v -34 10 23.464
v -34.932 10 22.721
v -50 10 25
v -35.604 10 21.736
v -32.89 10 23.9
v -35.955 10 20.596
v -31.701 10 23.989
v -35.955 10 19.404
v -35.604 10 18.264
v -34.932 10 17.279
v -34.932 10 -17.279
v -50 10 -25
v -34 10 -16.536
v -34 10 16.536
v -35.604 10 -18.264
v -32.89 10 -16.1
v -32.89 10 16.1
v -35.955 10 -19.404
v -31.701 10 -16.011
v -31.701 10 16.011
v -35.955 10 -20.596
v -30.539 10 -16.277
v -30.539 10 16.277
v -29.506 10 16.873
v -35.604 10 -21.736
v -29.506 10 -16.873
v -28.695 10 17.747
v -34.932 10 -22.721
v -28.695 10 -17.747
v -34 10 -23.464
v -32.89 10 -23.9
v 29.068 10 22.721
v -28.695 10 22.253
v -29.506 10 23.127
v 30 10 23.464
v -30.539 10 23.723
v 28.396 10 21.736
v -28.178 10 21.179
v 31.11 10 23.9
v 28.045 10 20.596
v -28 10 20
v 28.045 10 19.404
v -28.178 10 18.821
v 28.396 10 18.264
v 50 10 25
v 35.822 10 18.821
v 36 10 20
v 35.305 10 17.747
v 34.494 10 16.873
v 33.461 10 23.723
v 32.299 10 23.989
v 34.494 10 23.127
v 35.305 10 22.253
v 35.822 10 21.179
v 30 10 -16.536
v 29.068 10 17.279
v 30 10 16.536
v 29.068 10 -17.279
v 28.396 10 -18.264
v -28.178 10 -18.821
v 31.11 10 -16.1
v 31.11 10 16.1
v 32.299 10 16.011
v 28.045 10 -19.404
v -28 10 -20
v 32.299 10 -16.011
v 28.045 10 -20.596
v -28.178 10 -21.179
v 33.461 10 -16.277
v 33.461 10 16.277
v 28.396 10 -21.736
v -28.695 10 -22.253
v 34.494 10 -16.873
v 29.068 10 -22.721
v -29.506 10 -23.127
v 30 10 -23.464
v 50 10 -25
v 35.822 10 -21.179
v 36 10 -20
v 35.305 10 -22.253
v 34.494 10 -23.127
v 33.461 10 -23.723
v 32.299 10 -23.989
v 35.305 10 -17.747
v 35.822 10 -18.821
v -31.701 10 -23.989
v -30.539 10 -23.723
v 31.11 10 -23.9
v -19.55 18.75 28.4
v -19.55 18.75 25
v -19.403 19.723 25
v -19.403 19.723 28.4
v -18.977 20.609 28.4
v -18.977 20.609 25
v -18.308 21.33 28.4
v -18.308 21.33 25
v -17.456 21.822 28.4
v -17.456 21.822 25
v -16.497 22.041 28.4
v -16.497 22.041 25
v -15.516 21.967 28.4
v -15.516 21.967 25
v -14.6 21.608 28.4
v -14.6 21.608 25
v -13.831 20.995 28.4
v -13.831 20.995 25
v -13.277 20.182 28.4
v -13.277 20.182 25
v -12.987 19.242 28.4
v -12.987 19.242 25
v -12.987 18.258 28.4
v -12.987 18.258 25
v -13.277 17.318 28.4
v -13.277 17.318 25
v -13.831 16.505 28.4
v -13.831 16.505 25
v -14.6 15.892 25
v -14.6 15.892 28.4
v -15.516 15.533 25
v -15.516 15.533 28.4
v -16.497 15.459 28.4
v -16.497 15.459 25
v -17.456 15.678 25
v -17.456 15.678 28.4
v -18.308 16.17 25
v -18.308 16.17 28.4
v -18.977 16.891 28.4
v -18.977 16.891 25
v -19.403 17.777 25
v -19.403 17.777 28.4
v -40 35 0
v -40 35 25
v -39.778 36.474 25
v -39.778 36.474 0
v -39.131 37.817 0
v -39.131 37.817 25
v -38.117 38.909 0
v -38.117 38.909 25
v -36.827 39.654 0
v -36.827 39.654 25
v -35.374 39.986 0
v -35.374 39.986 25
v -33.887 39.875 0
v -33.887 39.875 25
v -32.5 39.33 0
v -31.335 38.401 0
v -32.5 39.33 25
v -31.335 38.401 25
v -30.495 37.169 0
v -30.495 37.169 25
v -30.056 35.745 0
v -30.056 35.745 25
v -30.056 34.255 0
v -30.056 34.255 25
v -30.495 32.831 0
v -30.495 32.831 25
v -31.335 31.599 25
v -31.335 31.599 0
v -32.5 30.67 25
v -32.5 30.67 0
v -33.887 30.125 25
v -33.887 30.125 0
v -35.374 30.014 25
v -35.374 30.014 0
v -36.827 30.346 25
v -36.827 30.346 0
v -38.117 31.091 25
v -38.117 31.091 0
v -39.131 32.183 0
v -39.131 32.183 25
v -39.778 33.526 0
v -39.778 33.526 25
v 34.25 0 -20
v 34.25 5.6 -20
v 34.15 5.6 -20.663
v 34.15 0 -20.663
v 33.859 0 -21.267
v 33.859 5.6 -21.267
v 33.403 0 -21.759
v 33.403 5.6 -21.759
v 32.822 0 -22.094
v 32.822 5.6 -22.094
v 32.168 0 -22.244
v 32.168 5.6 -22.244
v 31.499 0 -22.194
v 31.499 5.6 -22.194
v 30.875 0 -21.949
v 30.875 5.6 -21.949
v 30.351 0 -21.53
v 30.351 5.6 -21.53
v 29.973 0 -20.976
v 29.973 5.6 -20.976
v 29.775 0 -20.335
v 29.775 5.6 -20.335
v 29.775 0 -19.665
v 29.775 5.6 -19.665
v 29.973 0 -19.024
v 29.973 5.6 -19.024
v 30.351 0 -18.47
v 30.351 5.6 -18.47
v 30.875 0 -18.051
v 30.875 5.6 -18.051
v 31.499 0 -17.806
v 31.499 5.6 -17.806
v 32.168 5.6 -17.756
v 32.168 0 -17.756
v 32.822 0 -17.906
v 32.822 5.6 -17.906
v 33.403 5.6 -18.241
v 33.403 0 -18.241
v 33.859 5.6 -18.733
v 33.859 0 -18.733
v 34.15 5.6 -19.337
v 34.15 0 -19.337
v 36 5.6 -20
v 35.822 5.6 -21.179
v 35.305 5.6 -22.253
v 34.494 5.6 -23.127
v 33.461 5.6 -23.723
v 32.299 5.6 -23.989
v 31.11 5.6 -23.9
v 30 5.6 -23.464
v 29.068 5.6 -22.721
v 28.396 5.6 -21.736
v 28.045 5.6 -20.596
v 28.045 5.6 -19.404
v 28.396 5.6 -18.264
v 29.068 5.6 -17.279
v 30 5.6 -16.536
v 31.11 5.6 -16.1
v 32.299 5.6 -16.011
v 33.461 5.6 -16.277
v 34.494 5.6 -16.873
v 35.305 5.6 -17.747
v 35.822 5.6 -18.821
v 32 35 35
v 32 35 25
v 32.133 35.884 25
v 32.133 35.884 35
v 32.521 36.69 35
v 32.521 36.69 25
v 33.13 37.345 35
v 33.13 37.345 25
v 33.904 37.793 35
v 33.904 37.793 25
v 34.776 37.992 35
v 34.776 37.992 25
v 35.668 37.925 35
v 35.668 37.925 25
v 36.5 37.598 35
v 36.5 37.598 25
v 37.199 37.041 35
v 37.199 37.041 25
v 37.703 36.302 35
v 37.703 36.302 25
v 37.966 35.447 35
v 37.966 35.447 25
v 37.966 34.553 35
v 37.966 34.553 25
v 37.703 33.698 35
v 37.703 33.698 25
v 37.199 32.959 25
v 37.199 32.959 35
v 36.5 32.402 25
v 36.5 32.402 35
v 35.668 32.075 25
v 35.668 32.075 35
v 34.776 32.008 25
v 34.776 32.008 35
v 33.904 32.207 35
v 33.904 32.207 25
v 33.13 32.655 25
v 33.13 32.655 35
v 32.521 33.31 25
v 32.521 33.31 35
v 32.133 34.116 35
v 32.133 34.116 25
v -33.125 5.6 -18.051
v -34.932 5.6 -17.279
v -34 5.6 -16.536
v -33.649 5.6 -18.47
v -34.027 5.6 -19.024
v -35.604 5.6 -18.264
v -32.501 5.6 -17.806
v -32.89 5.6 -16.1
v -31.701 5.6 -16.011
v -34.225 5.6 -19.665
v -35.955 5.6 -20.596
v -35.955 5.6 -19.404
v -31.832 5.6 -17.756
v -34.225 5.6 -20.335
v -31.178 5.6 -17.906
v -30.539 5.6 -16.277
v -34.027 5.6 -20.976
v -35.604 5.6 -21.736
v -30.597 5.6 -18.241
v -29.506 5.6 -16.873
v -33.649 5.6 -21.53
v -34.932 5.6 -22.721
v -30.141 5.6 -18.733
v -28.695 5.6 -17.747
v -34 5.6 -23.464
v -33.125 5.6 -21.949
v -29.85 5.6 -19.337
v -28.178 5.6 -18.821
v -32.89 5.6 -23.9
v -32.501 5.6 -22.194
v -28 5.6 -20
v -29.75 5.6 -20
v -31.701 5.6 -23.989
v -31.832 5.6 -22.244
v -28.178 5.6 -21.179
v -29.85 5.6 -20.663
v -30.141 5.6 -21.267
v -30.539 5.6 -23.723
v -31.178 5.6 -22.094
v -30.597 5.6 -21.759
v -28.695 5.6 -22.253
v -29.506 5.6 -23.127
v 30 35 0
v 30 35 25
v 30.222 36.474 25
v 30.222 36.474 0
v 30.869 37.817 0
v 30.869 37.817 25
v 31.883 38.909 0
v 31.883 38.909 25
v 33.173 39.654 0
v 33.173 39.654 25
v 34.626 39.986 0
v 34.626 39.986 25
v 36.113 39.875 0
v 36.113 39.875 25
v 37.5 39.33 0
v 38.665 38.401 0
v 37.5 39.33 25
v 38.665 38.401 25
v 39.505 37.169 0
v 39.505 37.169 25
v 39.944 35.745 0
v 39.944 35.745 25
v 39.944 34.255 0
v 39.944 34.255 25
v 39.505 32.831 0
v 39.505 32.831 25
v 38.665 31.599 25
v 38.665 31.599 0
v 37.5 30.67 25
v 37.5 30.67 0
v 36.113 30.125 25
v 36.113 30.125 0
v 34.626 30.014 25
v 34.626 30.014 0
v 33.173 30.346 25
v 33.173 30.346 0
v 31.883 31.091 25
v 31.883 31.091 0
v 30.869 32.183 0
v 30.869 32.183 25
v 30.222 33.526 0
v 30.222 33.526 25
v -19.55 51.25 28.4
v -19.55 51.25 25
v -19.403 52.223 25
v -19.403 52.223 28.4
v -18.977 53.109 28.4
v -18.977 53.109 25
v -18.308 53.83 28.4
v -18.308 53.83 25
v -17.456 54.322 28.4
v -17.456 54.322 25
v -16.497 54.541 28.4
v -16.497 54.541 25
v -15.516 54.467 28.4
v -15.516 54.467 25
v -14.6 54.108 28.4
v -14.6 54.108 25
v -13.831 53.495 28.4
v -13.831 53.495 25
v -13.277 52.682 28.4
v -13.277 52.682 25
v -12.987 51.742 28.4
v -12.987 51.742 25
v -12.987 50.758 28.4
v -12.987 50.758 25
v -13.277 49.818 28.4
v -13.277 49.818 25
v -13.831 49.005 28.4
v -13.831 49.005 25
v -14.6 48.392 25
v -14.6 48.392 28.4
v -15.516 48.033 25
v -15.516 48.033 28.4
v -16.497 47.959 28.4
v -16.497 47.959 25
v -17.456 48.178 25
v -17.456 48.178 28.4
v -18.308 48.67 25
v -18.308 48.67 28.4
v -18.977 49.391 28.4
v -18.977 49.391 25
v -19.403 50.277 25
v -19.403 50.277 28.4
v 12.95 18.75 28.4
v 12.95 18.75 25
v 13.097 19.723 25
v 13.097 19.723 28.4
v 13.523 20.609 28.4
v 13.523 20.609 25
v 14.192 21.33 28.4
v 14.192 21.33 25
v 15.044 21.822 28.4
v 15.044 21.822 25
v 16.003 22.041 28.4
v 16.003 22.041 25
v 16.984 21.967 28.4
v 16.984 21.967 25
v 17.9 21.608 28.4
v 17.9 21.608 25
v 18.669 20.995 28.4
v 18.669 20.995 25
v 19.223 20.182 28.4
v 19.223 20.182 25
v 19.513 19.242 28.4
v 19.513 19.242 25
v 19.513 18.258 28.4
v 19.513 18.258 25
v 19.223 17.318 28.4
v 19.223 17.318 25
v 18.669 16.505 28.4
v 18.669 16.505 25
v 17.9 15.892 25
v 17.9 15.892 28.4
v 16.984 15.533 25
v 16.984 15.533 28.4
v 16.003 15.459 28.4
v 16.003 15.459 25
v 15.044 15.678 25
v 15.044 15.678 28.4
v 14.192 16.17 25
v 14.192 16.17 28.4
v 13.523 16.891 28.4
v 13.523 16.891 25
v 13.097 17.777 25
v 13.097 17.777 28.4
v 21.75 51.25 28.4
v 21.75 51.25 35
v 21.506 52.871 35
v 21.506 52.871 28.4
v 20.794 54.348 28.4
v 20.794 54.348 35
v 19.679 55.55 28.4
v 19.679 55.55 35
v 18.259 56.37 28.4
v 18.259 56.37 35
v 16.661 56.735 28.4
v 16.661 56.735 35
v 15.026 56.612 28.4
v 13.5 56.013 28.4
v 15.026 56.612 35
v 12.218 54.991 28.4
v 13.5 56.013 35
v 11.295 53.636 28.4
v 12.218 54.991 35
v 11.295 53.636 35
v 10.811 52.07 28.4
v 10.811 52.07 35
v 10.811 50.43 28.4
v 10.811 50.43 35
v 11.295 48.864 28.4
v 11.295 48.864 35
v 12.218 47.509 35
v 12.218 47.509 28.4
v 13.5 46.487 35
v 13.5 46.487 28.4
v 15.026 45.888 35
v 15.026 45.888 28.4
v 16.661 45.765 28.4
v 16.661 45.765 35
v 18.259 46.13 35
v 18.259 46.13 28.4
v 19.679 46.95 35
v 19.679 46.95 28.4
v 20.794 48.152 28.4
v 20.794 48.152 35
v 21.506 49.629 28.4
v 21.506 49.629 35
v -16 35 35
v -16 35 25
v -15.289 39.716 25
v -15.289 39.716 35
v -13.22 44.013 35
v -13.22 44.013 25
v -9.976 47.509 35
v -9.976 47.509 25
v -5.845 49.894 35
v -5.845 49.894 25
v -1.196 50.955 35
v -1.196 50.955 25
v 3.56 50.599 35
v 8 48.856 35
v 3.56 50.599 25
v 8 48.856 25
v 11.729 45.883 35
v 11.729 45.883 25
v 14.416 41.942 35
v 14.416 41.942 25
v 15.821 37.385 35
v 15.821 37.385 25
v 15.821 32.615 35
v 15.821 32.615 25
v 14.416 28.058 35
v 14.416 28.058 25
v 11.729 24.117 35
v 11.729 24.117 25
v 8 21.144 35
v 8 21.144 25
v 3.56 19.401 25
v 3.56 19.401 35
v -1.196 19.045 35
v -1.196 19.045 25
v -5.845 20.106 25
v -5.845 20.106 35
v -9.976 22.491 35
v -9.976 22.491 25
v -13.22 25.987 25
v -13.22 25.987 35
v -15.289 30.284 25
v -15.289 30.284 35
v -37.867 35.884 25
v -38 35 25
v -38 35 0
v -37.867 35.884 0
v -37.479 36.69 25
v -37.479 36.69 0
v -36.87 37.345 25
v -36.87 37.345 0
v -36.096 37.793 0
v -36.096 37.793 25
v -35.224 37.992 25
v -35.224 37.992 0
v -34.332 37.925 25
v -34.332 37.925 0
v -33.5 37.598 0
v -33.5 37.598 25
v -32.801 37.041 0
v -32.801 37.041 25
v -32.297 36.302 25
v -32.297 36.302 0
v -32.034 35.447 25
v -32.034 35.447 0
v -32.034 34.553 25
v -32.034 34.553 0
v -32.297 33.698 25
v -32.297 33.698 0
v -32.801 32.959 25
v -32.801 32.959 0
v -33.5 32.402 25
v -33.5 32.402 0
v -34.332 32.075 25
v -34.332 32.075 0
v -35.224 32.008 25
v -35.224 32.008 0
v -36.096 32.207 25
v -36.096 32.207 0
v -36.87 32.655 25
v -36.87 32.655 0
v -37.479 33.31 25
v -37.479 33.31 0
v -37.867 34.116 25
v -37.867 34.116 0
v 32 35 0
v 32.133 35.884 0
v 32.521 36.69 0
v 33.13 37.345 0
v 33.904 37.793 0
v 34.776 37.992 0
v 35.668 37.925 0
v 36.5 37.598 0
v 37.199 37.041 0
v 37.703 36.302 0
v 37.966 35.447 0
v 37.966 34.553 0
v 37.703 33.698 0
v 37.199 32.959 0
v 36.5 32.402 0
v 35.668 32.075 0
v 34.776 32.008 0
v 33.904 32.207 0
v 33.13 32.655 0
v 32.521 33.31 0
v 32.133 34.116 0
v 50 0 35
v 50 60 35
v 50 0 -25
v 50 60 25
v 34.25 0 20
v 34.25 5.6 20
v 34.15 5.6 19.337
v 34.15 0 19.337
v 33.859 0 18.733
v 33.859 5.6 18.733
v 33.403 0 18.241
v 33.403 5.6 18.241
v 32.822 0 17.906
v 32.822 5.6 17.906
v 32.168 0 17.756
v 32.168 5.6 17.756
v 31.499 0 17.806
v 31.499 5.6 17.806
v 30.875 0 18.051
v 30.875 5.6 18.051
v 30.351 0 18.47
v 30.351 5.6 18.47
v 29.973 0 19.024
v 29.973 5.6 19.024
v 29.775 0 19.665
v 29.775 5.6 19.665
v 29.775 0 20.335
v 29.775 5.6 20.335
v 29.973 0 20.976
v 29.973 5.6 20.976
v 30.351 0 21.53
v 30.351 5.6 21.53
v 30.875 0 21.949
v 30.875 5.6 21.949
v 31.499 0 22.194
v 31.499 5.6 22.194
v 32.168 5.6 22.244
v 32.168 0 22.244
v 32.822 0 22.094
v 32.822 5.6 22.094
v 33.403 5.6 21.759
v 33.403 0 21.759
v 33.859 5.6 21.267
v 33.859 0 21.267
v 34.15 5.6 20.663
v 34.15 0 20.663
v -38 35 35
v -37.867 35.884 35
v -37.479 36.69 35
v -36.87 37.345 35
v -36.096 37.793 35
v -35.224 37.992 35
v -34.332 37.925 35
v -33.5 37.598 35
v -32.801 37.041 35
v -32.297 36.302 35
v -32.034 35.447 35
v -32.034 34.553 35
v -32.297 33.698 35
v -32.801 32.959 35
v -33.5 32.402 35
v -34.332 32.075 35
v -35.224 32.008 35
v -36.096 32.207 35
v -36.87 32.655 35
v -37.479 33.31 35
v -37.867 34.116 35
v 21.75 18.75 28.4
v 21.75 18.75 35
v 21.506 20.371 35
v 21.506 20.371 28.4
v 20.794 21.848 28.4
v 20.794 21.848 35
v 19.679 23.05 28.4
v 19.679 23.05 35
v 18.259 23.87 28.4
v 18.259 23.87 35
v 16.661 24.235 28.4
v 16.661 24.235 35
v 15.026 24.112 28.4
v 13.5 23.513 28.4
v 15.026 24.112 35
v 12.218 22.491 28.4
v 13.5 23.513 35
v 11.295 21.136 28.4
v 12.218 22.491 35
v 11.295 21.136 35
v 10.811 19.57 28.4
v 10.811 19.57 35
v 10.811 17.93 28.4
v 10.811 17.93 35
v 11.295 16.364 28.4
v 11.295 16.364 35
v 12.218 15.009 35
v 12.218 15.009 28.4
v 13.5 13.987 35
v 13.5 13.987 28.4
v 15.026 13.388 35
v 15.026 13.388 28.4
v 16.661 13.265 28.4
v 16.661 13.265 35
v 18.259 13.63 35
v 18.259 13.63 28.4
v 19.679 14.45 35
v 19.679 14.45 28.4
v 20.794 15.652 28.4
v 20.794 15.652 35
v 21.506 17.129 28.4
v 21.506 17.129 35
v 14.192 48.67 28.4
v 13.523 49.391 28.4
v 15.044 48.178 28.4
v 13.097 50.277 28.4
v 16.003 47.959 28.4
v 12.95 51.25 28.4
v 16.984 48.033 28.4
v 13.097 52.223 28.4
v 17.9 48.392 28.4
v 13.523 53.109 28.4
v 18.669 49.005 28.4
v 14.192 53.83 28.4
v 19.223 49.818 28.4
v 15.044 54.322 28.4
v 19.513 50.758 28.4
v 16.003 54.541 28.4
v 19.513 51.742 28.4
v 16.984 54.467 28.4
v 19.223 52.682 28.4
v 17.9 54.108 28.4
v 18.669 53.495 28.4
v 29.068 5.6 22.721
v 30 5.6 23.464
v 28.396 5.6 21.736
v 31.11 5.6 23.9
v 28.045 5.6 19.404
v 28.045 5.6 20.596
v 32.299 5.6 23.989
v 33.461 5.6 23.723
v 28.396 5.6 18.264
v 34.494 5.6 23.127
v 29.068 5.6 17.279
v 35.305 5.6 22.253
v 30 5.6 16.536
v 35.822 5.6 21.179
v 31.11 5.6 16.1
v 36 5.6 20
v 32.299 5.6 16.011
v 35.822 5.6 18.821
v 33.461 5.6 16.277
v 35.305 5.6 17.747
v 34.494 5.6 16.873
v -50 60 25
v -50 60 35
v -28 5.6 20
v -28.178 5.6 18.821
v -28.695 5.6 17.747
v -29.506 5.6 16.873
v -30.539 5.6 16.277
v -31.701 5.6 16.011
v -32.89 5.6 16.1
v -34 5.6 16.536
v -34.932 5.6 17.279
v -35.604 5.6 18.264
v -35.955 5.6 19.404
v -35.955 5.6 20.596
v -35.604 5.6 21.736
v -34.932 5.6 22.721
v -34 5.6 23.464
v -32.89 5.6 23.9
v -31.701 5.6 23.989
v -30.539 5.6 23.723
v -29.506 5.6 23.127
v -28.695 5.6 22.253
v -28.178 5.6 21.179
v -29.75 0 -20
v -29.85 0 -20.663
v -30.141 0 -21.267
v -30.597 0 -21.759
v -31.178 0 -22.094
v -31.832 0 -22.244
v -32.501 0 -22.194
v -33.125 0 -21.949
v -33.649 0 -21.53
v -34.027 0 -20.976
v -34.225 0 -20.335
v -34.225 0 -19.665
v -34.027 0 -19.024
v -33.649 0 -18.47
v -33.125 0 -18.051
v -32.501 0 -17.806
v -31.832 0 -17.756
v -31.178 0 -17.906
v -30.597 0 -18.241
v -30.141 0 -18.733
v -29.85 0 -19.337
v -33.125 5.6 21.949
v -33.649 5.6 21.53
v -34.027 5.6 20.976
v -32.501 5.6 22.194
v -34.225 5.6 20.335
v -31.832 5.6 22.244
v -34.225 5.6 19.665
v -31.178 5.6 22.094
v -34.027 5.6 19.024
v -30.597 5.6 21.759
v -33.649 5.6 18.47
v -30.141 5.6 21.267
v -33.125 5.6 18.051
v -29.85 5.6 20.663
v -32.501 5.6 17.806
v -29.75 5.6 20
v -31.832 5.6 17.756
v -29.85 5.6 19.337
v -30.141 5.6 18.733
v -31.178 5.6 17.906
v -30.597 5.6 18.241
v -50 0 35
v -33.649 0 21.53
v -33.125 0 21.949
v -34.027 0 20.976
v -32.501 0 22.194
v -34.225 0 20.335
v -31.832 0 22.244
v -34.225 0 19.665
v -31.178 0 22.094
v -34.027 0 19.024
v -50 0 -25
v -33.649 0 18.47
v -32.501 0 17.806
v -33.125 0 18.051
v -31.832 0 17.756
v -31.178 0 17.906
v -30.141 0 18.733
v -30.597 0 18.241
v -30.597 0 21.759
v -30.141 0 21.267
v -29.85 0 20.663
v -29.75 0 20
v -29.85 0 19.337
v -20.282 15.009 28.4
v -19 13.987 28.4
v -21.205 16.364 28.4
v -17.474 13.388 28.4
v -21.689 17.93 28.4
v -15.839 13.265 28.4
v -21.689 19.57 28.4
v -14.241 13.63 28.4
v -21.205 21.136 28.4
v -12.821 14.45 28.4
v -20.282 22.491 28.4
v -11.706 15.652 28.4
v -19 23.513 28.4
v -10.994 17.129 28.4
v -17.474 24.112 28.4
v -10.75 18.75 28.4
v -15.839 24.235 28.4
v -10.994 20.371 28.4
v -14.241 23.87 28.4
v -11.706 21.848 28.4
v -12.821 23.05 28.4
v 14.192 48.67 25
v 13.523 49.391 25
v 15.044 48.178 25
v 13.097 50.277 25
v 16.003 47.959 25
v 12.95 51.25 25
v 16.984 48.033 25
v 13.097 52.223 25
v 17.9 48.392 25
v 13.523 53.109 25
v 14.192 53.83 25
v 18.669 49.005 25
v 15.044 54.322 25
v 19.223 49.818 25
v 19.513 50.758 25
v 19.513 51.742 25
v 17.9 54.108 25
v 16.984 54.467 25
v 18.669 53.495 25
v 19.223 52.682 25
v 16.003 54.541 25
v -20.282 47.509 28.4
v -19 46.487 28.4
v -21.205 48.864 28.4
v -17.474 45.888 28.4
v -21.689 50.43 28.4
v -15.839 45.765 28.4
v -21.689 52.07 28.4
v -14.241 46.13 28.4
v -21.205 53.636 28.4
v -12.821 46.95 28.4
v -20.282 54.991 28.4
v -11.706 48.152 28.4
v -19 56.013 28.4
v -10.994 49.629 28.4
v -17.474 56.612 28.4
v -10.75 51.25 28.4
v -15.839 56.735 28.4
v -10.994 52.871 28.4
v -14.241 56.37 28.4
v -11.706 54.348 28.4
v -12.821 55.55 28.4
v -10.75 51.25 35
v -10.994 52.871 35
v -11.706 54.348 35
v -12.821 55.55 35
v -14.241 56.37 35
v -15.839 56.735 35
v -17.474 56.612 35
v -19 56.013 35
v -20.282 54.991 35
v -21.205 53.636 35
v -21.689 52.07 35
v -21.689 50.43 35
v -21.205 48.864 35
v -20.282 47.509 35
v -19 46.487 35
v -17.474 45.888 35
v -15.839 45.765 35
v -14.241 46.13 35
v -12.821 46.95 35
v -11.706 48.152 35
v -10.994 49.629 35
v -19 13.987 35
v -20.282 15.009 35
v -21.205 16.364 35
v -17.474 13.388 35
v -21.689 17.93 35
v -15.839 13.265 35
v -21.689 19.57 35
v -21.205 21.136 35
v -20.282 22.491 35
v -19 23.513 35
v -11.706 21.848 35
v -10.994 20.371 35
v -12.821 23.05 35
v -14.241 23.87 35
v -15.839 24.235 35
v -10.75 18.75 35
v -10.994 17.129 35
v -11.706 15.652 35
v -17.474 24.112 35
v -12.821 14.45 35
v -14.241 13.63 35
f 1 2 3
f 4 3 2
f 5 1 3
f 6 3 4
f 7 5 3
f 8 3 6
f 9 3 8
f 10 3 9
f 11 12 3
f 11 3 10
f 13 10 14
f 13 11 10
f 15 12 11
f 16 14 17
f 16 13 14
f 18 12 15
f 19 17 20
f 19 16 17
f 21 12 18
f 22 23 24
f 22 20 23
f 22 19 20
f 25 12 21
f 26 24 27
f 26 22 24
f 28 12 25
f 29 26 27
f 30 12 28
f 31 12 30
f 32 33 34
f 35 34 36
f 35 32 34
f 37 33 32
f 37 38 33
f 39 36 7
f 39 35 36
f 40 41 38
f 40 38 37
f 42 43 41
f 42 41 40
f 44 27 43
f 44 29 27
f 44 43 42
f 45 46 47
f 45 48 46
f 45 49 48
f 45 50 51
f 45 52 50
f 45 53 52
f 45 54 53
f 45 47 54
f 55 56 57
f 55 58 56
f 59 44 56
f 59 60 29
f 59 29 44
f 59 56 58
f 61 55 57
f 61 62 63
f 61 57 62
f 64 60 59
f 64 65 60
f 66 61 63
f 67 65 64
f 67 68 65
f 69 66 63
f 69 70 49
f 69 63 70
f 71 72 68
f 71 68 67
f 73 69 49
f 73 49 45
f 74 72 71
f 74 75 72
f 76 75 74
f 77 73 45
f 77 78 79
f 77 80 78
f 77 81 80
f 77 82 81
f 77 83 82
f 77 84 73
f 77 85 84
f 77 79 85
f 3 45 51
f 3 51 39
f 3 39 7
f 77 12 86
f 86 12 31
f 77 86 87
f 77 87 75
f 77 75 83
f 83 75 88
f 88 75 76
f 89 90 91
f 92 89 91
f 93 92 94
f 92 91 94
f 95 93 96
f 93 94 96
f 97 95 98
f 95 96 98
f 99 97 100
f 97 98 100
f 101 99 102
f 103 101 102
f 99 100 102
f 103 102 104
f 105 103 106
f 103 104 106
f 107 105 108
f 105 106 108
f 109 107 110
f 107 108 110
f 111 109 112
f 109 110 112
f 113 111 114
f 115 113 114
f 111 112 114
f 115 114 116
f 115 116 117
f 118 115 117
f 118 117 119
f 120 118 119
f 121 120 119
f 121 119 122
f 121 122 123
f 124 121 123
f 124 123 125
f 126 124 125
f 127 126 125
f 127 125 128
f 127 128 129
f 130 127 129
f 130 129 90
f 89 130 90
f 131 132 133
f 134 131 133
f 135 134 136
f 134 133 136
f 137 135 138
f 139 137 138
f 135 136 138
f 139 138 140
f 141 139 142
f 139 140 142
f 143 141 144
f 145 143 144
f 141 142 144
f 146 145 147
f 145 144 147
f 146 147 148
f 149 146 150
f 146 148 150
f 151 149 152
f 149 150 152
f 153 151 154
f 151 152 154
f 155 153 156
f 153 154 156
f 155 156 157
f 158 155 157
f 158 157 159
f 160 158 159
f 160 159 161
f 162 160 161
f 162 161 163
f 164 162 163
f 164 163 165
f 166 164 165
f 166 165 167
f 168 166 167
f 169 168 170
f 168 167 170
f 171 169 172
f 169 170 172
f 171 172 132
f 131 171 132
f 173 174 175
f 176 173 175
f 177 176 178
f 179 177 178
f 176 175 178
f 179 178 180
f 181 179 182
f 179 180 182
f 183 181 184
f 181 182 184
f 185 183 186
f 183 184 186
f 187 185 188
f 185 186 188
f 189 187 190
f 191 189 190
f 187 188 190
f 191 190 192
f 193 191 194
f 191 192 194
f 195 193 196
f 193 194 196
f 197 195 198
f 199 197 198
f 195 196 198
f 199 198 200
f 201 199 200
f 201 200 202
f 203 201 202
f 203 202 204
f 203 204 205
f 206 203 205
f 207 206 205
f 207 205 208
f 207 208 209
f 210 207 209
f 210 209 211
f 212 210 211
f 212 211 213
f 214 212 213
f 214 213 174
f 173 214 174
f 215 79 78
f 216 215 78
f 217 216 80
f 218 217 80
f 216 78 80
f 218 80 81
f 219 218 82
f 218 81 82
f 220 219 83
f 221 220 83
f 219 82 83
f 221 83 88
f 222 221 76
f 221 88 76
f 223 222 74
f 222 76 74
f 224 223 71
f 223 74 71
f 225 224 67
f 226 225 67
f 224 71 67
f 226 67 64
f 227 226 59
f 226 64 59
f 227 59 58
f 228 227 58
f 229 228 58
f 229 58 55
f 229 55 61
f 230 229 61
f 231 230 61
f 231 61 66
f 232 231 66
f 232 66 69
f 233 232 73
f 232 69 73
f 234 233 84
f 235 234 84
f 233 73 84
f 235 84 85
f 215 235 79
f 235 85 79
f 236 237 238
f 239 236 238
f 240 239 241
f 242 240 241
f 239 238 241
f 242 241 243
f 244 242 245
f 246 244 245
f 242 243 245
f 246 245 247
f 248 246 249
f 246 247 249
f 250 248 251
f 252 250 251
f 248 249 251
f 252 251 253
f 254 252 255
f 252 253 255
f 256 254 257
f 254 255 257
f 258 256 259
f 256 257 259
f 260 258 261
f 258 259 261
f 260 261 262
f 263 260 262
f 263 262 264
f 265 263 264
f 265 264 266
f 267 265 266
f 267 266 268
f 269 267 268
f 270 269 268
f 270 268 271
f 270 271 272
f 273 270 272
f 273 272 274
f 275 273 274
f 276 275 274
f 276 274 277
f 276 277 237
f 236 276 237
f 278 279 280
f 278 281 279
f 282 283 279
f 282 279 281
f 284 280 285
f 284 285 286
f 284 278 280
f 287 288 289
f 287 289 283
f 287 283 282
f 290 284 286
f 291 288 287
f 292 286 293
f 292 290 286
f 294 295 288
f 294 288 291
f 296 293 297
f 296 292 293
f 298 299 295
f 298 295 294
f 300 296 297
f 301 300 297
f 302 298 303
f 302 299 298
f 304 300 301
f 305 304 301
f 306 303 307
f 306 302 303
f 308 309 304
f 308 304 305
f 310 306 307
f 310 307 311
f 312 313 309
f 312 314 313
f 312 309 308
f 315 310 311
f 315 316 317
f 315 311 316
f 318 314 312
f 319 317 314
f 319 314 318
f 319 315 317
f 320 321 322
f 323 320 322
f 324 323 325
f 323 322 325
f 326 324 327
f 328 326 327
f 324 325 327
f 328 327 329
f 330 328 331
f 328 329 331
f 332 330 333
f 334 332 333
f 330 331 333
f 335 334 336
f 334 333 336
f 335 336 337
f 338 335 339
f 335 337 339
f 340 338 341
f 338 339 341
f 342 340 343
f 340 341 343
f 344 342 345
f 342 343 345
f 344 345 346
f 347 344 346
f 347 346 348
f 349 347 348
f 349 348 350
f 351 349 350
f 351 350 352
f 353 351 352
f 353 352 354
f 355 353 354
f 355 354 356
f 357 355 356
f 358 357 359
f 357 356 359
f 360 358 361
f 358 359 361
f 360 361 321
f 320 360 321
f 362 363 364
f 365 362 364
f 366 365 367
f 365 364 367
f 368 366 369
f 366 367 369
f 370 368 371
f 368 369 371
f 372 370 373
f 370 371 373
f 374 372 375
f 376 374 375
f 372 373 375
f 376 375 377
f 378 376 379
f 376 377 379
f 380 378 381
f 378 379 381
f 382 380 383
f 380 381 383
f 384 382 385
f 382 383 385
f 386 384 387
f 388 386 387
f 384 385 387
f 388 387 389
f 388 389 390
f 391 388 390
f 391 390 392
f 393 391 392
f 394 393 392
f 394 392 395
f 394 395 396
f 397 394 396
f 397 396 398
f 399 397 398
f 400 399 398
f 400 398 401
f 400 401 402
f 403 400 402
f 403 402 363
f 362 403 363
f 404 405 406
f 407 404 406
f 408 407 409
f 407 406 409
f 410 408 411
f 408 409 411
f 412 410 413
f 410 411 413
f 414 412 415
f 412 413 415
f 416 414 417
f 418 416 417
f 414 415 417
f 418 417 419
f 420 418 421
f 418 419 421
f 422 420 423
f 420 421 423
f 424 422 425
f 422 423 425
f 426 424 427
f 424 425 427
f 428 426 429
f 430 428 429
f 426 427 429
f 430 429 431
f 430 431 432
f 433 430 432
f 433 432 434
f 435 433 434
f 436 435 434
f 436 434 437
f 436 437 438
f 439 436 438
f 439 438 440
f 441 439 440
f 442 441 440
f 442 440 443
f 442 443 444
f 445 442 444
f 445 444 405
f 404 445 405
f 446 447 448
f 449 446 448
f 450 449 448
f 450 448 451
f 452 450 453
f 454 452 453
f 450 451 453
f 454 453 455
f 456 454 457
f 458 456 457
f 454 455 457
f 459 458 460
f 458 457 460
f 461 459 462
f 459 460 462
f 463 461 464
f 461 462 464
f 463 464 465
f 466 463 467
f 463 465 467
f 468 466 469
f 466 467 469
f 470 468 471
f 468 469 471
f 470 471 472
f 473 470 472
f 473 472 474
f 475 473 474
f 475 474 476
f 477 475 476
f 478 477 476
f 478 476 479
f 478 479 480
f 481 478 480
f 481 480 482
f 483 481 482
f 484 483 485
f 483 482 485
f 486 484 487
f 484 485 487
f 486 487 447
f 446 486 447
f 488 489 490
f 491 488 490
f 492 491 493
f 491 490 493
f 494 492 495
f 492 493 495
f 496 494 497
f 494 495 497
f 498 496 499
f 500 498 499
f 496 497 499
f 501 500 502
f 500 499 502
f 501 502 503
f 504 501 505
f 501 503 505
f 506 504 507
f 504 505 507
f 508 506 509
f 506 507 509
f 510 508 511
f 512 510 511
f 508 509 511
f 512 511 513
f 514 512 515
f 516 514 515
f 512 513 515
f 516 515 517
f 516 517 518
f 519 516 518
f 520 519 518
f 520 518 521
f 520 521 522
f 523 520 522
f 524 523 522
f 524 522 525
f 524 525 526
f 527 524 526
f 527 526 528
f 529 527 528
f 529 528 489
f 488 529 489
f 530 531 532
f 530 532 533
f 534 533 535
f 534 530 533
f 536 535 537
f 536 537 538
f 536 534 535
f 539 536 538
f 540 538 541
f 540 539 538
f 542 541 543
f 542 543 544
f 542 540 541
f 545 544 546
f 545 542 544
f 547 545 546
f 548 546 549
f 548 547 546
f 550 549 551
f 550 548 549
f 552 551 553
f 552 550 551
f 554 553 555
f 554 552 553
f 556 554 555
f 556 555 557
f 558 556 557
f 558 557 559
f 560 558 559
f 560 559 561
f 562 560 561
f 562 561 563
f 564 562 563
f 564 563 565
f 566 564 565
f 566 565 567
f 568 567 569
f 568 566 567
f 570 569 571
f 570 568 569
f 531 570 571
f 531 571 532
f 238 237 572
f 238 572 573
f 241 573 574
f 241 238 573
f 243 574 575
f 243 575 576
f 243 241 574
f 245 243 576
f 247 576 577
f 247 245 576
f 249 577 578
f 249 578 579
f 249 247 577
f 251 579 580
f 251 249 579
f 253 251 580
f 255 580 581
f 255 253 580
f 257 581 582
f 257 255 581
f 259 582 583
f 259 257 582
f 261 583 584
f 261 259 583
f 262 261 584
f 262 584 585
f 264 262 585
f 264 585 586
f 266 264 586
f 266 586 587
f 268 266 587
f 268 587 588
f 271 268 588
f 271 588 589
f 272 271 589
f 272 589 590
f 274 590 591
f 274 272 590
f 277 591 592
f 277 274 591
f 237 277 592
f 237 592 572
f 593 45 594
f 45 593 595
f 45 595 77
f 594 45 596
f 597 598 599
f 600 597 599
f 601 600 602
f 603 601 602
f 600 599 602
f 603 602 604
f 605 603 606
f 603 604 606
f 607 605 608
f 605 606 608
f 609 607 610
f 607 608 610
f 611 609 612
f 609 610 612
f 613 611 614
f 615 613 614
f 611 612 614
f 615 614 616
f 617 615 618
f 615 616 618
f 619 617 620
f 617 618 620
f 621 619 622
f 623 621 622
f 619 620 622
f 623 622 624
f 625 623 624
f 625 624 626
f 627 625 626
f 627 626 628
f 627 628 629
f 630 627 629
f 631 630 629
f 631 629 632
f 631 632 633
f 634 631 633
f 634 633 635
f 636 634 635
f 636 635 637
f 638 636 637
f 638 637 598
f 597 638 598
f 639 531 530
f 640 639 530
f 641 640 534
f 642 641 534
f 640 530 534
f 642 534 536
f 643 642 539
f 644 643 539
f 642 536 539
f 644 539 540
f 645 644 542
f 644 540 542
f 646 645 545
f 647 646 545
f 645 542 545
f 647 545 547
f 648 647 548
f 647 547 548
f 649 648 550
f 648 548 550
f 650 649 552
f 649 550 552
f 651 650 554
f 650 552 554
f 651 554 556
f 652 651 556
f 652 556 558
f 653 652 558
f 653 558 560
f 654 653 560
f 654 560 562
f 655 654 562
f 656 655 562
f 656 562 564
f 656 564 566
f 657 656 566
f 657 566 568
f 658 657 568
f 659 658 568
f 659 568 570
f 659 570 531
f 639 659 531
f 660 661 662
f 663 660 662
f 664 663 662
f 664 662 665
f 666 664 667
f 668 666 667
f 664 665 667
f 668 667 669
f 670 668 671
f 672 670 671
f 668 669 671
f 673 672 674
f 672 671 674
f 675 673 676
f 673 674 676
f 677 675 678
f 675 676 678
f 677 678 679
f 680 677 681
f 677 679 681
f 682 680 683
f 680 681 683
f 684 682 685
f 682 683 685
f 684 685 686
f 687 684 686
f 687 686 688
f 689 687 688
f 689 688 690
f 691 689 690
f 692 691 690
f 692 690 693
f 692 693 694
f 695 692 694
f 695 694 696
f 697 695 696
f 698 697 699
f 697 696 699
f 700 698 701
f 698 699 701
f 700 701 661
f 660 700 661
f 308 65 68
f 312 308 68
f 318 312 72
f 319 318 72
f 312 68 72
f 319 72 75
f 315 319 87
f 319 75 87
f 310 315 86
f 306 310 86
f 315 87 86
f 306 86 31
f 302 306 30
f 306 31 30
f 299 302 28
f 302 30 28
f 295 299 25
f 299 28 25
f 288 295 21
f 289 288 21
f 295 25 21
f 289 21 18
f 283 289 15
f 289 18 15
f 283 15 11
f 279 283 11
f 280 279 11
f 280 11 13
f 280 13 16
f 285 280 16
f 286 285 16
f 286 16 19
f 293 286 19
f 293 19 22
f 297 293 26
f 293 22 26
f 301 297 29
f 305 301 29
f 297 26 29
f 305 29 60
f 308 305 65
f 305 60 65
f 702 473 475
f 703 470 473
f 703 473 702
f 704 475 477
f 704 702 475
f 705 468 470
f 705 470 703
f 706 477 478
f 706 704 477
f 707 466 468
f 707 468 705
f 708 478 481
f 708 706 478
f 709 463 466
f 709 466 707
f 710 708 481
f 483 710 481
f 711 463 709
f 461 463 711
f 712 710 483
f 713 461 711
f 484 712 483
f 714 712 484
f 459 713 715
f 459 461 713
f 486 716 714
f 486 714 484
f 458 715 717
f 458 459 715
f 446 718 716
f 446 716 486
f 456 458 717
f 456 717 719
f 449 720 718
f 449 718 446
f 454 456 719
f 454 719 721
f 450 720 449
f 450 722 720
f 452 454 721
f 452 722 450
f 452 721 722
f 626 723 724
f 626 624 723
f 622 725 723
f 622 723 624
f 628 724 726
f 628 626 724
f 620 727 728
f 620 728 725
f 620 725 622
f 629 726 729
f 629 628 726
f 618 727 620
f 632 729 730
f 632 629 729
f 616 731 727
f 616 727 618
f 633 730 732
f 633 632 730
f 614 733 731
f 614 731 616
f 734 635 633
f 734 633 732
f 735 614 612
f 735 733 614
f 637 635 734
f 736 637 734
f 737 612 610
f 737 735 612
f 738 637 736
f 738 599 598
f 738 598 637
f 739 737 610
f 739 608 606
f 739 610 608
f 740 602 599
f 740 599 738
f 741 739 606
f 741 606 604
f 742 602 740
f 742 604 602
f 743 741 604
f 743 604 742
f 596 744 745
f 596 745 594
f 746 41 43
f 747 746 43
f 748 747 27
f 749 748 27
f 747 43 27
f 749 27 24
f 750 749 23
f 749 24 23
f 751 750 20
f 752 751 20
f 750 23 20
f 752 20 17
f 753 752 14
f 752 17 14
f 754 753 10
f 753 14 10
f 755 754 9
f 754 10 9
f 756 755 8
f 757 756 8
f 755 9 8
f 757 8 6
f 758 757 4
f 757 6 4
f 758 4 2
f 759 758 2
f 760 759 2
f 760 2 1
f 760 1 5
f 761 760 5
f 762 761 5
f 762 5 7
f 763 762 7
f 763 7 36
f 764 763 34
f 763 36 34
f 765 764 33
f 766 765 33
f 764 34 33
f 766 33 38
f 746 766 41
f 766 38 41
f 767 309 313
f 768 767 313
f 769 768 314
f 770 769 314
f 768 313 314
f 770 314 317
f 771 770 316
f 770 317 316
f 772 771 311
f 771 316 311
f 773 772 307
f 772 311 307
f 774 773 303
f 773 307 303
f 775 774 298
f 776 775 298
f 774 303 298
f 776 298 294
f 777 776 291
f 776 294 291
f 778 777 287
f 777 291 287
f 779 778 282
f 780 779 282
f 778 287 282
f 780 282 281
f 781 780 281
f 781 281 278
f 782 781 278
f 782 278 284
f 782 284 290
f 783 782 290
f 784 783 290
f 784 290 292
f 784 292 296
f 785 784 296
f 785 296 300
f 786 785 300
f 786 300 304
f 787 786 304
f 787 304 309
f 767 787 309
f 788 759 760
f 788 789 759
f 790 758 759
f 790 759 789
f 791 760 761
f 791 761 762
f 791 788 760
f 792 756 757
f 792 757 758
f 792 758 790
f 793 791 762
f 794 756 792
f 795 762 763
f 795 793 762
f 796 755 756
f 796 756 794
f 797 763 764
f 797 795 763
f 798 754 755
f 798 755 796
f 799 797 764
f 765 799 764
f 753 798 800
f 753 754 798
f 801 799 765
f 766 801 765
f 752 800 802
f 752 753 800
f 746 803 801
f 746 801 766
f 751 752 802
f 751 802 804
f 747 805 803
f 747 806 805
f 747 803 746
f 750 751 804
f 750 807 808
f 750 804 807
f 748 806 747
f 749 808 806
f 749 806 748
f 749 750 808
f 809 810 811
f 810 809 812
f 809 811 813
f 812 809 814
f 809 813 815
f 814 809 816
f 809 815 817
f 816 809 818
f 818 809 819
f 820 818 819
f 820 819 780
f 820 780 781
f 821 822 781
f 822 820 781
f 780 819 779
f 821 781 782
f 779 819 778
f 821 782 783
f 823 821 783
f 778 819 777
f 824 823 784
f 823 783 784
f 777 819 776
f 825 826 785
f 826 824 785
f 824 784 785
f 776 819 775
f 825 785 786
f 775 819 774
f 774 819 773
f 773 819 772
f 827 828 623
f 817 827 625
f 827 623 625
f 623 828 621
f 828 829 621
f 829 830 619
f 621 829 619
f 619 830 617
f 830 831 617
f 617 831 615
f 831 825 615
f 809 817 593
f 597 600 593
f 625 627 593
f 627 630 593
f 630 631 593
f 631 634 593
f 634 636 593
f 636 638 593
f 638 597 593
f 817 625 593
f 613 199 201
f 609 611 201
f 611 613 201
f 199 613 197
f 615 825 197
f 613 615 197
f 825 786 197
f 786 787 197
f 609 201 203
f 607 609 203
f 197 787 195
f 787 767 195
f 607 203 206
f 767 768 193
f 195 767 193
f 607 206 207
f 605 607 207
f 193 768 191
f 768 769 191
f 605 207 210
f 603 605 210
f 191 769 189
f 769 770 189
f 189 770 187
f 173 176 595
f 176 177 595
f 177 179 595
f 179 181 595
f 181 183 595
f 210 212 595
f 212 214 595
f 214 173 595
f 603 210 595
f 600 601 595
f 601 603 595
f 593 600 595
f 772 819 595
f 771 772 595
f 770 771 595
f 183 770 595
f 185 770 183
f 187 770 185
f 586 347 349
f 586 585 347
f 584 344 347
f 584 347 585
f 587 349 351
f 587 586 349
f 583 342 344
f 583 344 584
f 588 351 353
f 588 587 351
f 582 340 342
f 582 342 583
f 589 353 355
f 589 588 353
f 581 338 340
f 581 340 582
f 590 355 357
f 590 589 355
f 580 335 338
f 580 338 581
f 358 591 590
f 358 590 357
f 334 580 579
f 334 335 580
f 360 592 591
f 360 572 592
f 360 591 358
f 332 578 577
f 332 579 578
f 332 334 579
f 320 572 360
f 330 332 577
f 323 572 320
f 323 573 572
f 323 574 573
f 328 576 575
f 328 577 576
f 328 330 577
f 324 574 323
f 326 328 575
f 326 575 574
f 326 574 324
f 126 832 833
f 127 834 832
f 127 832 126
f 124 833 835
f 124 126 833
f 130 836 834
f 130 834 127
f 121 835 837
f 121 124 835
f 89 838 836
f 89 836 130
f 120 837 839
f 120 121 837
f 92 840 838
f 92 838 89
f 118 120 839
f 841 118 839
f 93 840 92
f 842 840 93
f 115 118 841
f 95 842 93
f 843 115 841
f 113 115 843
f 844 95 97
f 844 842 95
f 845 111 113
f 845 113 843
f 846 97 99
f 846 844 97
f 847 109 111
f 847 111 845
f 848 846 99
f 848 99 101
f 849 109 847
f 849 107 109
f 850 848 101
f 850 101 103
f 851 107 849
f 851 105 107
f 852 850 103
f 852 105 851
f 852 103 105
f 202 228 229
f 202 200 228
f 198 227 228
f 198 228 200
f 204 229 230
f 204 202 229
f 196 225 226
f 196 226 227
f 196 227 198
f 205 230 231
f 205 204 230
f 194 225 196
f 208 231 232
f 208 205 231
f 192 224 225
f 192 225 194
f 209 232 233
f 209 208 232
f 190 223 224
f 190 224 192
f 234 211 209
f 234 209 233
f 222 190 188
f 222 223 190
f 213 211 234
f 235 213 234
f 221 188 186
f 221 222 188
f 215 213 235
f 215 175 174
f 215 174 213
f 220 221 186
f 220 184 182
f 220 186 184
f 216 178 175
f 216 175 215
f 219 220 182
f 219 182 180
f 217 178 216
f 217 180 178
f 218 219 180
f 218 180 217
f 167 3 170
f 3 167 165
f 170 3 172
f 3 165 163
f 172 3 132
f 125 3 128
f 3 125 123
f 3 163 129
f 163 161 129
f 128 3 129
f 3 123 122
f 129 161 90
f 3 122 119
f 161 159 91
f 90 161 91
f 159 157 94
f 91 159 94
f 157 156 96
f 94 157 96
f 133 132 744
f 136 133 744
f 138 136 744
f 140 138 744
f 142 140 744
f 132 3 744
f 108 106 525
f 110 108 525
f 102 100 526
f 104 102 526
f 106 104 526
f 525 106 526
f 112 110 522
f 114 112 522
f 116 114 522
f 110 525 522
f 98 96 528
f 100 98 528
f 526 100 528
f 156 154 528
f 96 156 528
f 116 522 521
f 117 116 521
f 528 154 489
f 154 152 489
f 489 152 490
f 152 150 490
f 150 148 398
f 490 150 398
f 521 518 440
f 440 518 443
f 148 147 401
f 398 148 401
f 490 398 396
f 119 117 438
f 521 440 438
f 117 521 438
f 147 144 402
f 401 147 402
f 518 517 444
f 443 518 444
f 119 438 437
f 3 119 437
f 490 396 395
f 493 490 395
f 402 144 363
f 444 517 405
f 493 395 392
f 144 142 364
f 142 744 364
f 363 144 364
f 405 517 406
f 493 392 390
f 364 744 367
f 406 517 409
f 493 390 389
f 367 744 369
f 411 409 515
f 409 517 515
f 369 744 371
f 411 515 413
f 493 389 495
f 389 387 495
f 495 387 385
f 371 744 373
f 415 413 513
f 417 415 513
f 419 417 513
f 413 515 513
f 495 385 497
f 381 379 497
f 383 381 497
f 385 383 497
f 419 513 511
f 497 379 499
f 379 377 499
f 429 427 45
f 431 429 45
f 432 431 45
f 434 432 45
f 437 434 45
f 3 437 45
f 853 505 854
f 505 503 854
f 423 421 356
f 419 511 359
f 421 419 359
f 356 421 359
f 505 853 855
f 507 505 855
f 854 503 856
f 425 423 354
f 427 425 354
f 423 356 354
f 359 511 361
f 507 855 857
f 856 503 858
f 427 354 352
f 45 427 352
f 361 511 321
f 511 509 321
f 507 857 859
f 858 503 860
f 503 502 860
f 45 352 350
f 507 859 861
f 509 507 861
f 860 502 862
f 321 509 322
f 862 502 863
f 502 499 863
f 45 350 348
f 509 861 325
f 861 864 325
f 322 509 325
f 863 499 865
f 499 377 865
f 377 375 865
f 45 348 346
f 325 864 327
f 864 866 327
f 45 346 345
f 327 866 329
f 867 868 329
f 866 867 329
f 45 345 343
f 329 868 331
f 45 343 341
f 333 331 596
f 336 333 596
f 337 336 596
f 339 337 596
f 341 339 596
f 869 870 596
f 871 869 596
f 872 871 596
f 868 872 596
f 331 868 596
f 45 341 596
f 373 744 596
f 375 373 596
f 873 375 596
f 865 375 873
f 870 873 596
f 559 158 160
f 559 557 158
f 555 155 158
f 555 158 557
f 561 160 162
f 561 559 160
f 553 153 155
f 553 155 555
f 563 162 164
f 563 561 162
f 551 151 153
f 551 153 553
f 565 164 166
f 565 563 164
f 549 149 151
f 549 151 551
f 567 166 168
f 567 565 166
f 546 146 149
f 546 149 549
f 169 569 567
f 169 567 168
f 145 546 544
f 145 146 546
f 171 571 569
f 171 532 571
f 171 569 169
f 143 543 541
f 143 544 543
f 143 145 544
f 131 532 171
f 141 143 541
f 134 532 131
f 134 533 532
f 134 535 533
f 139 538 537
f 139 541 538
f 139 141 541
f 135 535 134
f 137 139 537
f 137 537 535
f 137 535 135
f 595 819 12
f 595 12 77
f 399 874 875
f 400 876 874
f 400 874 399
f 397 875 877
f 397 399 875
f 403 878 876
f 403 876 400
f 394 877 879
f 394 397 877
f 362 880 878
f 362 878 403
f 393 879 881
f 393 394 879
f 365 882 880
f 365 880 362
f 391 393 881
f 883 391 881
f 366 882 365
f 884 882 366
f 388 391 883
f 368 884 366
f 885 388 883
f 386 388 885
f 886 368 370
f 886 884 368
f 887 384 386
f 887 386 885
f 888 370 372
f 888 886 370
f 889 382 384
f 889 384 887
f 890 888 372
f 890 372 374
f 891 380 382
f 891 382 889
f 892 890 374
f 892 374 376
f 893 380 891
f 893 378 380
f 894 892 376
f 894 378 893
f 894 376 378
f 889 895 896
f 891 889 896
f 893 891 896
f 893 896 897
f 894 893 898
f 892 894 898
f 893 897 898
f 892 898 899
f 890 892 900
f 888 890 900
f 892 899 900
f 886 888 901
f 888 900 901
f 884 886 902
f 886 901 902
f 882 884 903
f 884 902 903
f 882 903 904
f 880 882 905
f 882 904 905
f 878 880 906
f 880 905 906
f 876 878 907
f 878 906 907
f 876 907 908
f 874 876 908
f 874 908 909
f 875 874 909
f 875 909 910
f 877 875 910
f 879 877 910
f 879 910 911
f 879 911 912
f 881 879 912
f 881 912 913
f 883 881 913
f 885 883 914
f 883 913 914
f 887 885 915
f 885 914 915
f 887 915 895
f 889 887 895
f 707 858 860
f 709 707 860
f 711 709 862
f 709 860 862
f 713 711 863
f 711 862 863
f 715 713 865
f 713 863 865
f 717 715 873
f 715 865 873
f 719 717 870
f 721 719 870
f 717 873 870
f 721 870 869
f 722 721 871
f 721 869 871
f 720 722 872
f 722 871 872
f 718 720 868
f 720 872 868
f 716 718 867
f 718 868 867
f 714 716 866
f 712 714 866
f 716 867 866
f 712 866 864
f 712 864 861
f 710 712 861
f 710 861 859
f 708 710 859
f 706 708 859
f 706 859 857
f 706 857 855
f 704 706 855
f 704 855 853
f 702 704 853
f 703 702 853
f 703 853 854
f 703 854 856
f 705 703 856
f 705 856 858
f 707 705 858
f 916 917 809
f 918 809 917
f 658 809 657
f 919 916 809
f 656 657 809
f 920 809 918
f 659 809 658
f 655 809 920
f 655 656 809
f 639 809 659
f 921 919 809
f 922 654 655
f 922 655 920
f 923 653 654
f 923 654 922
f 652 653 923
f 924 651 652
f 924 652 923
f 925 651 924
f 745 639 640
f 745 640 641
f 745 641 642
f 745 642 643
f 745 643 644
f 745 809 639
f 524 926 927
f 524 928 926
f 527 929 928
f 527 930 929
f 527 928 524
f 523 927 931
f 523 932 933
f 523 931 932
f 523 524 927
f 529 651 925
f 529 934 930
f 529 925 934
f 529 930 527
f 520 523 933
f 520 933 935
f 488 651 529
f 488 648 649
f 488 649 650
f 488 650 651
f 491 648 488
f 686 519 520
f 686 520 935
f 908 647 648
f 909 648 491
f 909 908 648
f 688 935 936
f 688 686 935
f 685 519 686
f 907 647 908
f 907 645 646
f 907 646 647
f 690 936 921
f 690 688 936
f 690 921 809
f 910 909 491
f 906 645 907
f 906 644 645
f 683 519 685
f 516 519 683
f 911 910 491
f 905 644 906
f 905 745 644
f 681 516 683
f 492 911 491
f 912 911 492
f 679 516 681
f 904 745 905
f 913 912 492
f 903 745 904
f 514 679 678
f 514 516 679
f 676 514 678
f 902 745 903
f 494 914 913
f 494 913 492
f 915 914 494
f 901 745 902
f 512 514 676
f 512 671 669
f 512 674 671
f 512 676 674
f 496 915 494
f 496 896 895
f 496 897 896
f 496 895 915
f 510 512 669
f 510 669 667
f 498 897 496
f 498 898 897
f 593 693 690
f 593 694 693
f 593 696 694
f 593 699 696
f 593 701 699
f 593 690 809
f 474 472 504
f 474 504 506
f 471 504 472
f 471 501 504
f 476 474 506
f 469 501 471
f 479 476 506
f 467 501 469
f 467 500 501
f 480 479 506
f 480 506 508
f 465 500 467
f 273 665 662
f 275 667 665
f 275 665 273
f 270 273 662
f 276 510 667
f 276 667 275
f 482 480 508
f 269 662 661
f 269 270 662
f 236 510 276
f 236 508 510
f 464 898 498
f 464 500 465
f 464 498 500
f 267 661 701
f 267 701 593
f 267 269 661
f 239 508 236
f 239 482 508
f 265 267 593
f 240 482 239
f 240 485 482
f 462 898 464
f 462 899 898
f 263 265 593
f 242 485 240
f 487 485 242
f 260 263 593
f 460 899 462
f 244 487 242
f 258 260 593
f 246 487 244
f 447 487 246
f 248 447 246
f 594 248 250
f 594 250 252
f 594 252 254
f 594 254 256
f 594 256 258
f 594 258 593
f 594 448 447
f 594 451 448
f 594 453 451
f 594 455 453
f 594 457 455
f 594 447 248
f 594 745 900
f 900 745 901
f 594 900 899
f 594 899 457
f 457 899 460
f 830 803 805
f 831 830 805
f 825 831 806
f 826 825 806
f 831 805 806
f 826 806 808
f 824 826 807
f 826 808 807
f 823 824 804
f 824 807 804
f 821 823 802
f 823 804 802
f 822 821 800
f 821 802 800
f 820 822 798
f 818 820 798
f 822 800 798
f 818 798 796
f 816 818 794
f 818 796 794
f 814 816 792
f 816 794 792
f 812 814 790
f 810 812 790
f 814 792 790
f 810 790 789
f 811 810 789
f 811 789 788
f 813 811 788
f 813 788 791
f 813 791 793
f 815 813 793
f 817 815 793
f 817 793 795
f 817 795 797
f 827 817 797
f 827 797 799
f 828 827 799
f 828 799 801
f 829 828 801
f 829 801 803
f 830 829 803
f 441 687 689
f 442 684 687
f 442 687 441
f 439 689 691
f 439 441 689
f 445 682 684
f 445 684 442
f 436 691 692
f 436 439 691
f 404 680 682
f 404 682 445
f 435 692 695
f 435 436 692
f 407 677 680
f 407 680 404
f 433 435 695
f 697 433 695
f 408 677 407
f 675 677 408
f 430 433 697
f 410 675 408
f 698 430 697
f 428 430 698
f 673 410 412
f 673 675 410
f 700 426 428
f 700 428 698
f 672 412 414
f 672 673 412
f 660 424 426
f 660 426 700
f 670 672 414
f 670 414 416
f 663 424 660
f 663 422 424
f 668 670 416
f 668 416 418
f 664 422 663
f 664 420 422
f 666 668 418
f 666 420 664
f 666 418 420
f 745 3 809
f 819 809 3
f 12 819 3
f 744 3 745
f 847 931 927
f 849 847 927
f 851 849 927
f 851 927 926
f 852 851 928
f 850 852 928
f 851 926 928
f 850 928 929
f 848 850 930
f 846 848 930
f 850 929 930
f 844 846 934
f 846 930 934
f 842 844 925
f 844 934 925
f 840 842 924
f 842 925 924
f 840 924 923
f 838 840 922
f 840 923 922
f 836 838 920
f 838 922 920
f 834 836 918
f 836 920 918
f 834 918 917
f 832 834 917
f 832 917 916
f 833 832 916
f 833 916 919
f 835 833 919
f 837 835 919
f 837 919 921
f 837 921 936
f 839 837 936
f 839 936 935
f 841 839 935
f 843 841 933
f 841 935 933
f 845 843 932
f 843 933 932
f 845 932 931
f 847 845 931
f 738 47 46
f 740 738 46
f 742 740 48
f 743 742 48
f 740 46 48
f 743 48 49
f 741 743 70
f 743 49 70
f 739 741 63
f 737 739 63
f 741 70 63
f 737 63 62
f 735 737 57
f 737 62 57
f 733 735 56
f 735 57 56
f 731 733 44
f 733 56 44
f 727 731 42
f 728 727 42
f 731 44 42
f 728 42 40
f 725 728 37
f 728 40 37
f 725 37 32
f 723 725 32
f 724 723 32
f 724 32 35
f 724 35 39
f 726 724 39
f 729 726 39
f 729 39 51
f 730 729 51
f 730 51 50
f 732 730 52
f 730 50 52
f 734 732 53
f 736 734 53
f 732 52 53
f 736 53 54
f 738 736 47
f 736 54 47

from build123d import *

# Parameters (mm, degrees)
SKETCH1_W           = 100
SKETCH1_H           = 50
BOSS_EXTRUDE1_DEPTH = 10
SKETCH2_R           = 2.25
CUT_EXTRUDE1_DEPTH  = 11
SKETCH3_R           = 4
CUT_EXTRUDE2_DEPTH  = 4.4
SKETCH4_W           = 100
SKETCH4_H           = 60
BOSS_EXTRUDE2_DEPTH = 10
SKETCH5_R           = 16
CUT_EXTRUDE3_DEPTH  = 11
SKETCH6_R           = 3.3
CUT_EXTRUDE4_DEPTH  = 11
SKETCH7_R           = 5.5
CUT_EXTRUDE5_DEPTH  = 6.6
SKETCH8_R           = 3
CUT_EXTRUDE6_DEPTH  = 11
SKETCH9_R           = 5
SKETCH9_R_2         = 3
BOSS_EXTRUDE3_DEPTH = 25


with BuildPart() as part:
    # Sketch1 → Boss-Extrude1 (new body)
    with BuildSketch(Plane(origin=(0, 0, 0), x_dir=(1, 0, 0), z_dir=(0, 1, 0))):
        Rectangle(SKETCH1_W, SKETCH1_H)
    extrude(amount=BOSS_EXTRUDE1_DEPTH)

    # Sketch2 → Cut-Extrude1 (cut, through all)
    with BuildSketch(Plane(origin=(0, 10, 0), x_dir=(1, 0, 0), z_dir=(0, 1, 0))):
        with Locations((32, 20)):
            Circle(SKETCH2_R)
        with Locations((32, -20)):
            Circle(SKETCH2_R)
        with Locations((-32, 20)):
            Circle(SKETCH2_R)
        with Locations((-32, -20)):
            Circle(SKETCH2_R)
    extrude(amount=-CUT_EXTRUDE1_DEPTH, mode=Mode.SUBTRACT)

    # Sketch3 → Cut-Extrude2 (cut)
    with BuildSketch(Plane(origin=(0, 10, 0), x_dir=(1, 0, 0), z_dir=(0, 1, 0))):
        with Locations((32, 20)):
            Circle(SKETCH3_R)
        with Locations((32, -20)):
            Circle(SKETCH3_R)
        with Locations((-32, 20)):
            Circle(SKETCH3_R)
        with Locations((-32, -20)):
            Circle(SKETCH3_R)
    extrude(amount=-CUT_EXTRUDE2_DEPTH, mode=Mode.SUBTRACT)

    # Sketch4 → Boss-Extrude2 (add)
    with BuildSketch(Plane.XY.offset(25)):
        with Locations((0, 30)):
            Rectangle(SKETCH4_W, SKETCH4_H)
    extrude(amount=BOSS_EXTRUDE2_DEPTH)

    # Sketch5 → Cut-Extrude3 (cut, through all)
    with BuildSketch(Plane(origin=(0, 0, 25), x_dir=(-1, 0, 0), z_dir=(0, 0, -1))):
        with Locations((0, 35)):
            Circle(SKETCH5_R)
    extrude(amount=-CUT_EXTRUDE3_DEPTH, mode=Mode.SUBTRACT)

    # Sketch6 → Cut-Extrude4 (cut, through all)
    with BuildSketch(Plane(origin=(0, 0, 25), x_dir=(-1, 0, 0), z_dir=(0, 0, -1))):
        with Locations((-16.25, 51.25)):
            Circle(SKETCH6_R)
        with Locations((-16.25, 18.75)):
            Circle(SKETCH6_R)
        with Locations((16.25, 18.75)):
            Circle(SKETCH6_R)
        with Locations((16.25, 51.25)):
            Circle(SKETCH6_R)
    extrude(amount=-CUT_EXTRUDE4_DEPTH, mode=Mode.SUBTRACT)

    # Sketch7 → Cut-Extrude5 (cut)
    with BuildSketch(Plane.XY.offset(35)):
        with Locations((-16.25, 51.25)):
            Circle(SKETCH7_R)
        with Locations((16.25, 51.25)):
            Circle(SKETCH7_R)
        with Locations((16.25, 18.75)):
            Circle(SKETCH7_R)
        with Locations((-16.25, 18.75)):
            Circle(SKETCH7_R)
    extrude(amount=-CUT_EXTRUDE5_DEPTH, mode=Mode.SUBTRACT)

    # Sketch8 → Cut-Extrude6 (cut, through all)
    with BuildSketch(Plane(origin=(0, 0, 25), x_dir=(-1, 0, 0), z_dir=(0, 0, -1))):
        with Locations((-35, 35)):
            Circle(SKETCH8_R)
        with Locations((35, 35)):
            Circle(SKETCH8_R)
    extrude(amount=-CUT_EXTRUDE6_DEPTH, mode=Mode.SUBTRACT)

    # Sketch9 → Boss-Extrude3 (add)
    with BuildSketch(Plane(origin=(0, 0, 25), x_dir=(-1, 0, 0), z_dir=(0, 0, -1))):
        with Locations((-35, 35)):
            Circle(SKETCH9_R)
        with Locations((-35, 35)):
            Circle(SKETCH9_R_2, mode=Mode.SUBTRACT)
        with Locations((35, 35)):
            Circle(SKETCH9_R)
        with Locations((35, 35)):
            Circle(SKETCH9_R_2, mode=Mode.SUBTRACT)
    extrude(amount=BOSS_EXTRUDE3_DEPTH)


solid = part.part
